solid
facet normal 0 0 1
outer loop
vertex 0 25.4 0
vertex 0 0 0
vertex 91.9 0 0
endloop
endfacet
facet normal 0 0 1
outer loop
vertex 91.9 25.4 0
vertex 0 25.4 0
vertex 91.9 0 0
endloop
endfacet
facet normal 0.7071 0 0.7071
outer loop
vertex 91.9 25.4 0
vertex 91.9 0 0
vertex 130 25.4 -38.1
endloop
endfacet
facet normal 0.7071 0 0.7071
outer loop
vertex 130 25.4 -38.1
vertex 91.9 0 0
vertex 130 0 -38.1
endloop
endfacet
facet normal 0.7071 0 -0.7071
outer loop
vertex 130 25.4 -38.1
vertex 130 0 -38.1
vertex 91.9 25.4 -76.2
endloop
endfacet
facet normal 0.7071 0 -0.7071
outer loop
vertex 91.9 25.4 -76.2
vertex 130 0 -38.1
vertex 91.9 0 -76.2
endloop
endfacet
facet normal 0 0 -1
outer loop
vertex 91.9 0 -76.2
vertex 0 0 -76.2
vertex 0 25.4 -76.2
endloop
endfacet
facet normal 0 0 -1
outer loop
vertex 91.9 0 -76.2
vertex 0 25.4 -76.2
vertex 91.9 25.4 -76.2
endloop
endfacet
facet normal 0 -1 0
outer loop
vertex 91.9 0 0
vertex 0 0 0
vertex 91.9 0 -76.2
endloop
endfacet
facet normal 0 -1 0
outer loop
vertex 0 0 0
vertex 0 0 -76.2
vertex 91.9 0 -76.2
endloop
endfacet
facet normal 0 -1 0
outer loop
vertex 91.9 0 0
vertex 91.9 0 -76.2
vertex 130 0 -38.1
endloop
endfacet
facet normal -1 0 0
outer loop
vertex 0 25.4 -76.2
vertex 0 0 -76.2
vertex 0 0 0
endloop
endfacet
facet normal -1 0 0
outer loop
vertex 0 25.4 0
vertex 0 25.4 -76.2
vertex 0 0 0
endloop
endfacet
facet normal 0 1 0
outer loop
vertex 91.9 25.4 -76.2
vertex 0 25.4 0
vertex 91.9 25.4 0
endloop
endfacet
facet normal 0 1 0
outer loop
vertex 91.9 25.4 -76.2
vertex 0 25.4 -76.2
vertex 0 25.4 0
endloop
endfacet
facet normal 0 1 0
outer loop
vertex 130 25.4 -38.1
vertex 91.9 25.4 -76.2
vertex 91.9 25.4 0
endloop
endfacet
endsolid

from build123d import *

# Parameters (mm, degrees)
SKETCH1_W           = 91.9
SKETCH1_H           = 38.1
BOSS_EXTRUDE1_DEPTH = 25.4


with BuildPart() as part:
    # Sketch1 → Boss-Extrude1 (new body)
    with BuildSketch(Plane(origin=(0, 0, 0), x_dir=(1, 0, 0), z_dir=(0, 1, 0))):
        with Locations((45.95, 19.05)):
            Rectangle(SKETCH1_W, SKETCH1_H)
        Polygon((91.9, 0), (130, 38.1), (91.9, 38.1), align=None)
        Polygon((130, 38.1), (91.9, 76.2), (91.9, 38.1), align=None)
        with Locations((45.95, 57.15)):
            Rectangle(SKETCH1_W, SKETCH1_H)
    extrude(amount=BOSS_EXTRUDE1_DEPTH)


solid = part.part
